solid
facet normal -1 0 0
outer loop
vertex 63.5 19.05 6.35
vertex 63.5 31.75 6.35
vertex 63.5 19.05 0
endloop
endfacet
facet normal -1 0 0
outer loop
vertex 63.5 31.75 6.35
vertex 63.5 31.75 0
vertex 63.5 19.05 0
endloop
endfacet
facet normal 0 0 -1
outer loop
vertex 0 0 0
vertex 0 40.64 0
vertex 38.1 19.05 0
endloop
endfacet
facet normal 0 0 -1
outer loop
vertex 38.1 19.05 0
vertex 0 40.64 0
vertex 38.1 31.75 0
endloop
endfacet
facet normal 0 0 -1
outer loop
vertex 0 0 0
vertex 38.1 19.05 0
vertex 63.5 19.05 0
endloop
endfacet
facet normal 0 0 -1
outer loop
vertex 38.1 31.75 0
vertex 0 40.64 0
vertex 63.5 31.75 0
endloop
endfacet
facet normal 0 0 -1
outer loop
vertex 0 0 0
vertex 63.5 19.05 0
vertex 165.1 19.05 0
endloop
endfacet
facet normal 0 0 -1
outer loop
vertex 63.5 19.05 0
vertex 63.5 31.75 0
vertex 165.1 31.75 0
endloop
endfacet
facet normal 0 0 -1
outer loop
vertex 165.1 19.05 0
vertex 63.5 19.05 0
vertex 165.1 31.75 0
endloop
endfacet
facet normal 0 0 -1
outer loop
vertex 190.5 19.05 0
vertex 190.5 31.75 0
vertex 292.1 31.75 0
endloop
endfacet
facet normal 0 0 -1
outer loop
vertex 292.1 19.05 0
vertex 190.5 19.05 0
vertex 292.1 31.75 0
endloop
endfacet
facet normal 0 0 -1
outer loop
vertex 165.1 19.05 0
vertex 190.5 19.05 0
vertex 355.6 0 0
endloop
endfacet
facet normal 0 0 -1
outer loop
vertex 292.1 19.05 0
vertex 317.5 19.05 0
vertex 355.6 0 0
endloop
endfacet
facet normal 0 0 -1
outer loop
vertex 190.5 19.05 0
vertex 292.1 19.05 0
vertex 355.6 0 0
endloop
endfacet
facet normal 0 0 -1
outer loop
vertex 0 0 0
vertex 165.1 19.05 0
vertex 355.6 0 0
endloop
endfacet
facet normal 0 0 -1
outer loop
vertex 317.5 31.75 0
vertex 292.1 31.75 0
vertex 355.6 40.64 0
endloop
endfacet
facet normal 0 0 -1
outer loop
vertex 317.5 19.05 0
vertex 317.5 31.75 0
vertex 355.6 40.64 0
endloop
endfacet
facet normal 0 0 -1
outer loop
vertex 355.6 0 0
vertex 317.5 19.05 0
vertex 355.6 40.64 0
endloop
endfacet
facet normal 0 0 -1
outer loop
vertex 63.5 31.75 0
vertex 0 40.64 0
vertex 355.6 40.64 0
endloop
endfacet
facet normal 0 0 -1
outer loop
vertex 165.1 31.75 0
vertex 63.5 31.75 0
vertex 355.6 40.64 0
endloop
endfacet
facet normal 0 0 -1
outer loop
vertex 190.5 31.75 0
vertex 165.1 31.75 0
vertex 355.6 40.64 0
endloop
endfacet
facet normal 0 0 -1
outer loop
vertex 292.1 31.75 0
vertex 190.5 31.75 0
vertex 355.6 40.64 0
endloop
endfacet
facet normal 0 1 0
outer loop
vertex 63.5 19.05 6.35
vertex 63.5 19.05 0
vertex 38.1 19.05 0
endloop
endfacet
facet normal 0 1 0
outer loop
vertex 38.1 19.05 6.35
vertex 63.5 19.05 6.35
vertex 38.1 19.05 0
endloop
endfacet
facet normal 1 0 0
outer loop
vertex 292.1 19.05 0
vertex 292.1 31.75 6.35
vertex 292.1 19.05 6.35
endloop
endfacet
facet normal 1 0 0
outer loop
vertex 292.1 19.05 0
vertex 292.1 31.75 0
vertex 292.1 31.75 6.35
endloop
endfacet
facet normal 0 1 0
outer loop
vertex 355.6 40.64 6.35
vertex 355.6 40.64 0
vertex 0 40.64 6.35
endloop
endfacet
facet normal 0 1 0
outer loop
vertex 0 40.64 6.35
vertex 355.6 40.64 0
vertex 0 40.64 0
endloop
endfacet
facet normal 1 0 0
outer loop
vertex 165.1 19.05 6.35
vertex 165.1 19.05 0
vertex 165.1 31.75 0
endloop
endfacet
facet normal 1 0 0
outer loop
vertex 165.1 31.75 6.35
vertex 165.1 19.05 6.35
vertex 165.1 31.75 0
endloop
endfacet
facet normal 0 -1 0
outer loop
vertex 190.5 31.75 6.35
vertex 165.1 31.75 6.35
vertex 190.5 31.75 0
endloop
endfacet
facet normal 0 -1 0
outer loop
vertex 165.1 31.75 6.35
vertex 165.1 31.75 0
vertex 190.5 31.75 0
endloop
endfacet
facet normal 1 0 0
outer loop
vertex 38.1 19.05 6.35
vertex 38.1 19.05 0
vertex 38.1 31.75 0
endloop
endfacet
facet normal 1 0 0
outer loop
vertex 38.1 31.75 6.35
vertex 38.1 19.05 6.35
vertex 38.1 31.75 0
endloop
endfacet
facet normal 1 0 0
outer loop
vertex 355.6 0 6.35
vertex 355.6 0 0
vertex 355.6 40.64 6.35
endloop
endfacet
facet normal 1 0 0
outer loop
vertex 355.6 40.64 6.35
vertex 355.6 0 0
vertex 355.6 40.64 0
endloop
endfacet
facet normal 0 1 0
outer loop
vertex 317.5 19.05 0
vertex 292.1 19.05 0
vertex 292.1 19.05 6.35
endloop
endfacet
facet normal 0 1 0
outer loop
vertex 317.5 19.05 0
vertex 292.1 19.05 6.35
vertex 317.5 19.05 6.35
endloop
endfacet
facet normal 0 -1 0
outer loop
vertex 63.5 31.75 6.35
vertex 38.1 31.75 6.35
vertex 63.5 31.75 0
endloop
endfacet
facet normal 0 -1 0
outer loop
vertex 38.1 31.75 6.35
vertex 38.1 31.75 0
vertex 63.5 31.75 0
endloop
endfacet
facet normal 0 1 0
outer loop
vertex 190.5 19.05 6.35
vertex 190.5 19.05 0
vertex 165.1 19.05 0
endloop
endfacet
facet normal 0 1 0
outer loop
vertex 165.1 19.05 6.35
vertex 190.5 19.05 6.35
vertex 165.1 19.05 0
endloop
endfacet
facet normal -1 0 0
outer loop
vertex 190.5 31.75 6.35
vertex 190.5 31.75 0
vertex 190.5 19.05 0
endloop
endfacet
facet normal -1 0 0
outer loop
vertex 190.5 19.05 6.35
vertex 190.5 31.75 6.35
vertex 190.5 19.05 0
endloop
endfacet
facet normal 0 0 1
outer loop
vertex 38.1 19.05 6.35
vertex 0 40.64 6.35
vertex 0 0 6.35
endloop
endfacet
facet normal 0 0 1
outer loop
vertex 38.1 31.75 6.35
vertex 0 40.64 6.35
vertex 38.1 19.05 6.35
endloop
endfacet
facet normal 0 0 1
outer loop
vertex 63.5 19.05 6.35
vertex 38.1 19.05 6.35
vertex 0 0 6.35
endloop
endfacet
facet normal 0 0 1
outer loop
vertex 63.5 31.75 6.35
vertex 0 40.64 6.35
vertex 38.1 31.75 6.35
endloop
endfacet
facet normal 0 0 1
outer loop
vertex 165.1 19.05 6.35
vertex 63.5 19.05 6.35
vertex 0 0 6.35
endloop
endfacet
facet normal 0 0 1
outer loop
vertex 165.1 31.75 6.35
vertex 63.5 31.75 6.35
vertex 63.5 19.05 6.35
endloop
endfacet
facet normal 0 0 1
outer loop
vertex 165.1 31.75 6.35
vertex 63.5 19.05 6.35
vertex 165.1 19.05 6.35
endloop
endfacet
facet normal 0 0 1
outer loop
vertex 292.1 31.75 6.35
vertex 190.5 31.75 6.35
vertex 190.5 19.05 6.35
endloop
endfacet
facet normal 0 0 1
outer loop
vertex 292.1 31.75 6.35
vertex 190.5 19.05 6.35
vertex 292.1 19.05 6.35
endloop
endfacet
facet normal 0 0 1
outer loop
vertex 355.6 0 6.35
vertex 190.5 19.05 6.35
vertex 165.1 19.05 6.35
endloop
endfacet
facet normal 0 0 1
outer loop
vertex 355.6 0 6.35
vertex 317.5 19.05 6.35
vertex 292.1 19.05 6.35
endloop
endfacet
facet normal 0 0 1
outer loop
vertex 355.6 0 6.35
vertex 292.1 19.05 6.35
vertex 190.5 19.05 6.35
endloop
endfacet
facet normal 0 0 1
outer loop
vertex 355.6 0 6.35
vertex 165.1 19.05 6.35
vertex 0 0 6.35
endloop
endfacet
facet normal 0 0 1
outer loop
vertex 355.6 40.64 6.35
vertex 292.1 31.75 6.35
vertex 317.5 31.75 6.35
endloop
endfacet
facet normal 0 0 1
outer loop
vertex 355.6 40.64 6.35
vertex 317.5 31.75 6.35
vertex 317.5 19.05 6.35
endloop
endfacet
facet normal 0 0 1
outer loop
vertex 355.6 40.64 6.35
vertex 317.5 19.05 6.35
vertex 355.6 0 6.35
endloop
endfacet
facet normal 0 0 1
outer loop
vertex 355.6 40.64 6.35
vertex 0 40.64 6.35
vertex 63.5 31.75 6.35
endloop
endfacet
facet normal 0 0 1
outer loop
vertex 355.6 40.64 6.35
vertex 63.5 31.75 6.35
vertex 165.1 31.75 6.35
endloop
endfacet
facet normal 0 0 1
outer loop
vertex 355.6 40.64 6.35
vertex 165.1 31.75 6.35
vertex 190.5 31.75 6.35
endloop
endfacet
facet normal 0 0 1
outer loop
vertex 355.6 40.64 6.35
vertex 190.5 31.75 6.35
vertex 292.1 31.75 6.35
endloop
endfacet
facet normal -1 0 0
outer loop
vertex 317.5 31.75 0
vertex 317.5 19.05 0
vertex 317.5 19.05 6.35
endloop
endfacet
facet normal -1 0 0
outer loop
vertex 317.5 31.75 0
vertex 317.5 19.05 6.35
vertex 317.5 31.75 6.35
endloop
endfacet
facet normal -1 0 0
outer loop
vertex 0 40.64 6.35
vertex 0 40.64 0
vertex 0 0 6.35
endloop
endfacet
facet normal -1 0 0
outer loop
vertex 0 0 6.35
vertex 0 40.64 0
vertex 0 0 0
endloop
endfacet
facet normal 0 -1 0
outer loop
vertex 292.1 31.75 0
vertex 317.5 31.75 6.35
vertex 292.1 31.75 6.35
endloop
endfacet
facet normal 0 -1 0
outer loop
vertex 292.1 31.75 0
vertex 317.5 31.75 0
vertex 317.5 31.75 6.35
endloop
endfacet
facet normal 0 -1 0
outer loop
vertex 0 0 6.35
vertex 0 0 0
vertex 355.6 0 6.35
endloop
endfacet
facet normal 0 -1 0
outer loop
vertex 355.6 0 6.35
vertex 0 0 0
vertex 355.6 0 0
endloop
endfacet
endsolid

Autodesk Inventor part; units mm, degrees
ref_plane "YZ Plane" through (0, 0, 0) normal (1, 0, 0) x (0, 1, 0)
ref_plane "XZ Plane" through (0, 0, 0) normal (0, 1, 0) x (-1, 0, 0)
ref_plane "XY Plane" through (0, 0, 0) normal (0, 0, 1) x (1, 0, 0)
sketch "Sketch1" plane through (0, 0, 0) normal (0, 0, 1) x (1, 0, 0)
  line L0 (0, 0) -> (355.6, 0)
  line L1 (355.6, 0) -> (355.6, 40.64)
  line L2 (355.6, 40.64) -> (0, 40.64)
  line L3 (0, 40.64) -> (0, 0)
  line L4 (0, 31.75) -> (355.6, 31.75) construction
  line L5 (38.1, 31.75) -> (63.5, 31.75)
  line L6 (63.5, 31.75) -> (63.5, 19.05)
  line L7 (63.5, 19.05) -> (38.1, 19.05)
  line L8 (38.1, 19.05) -> (38.1, 31.75)
  line L9 (317.5, 31.75) -> (292.1, 31.75)
  line L10 (292.1, 31.75) -> (292.1, 19.05)
  line L11 (292.1, 19.05) -> (317.5, 19.05)
  line L12 (317.5, 19.05) -> (317.5, 31.75)
  line L13 (165.1, 31.75) -> (190.5, 31.75)
  line L14 (190.5, 31.75) -> (190.5, 19.05)
  line L15 (190.5, 19.05) -> (165.1, 19.05)
  line L16 (165.1, 19.05) -> (165.1, 31.75)
  dimension "d0" = 355.6
  dimension "d1" = 40.64
  dimension "d2" = 8.89
  dimension "d3" = 25.4
  dimension "d4" = 12.7
  dimension "d5" = 38.1
  dimension "d6" = 25.4
  dimension "d7" = 12.7
  dimension "d8" = 25.4
  dimension "d9" = 12.7
  dimension "d10" = 38.1
  dimension "d11" = 165.1
extrude "Extrusion1" add sketch "Sketch1" along normal blind 6.35
properties part number "latchplate" material "Aluminum 6061"
